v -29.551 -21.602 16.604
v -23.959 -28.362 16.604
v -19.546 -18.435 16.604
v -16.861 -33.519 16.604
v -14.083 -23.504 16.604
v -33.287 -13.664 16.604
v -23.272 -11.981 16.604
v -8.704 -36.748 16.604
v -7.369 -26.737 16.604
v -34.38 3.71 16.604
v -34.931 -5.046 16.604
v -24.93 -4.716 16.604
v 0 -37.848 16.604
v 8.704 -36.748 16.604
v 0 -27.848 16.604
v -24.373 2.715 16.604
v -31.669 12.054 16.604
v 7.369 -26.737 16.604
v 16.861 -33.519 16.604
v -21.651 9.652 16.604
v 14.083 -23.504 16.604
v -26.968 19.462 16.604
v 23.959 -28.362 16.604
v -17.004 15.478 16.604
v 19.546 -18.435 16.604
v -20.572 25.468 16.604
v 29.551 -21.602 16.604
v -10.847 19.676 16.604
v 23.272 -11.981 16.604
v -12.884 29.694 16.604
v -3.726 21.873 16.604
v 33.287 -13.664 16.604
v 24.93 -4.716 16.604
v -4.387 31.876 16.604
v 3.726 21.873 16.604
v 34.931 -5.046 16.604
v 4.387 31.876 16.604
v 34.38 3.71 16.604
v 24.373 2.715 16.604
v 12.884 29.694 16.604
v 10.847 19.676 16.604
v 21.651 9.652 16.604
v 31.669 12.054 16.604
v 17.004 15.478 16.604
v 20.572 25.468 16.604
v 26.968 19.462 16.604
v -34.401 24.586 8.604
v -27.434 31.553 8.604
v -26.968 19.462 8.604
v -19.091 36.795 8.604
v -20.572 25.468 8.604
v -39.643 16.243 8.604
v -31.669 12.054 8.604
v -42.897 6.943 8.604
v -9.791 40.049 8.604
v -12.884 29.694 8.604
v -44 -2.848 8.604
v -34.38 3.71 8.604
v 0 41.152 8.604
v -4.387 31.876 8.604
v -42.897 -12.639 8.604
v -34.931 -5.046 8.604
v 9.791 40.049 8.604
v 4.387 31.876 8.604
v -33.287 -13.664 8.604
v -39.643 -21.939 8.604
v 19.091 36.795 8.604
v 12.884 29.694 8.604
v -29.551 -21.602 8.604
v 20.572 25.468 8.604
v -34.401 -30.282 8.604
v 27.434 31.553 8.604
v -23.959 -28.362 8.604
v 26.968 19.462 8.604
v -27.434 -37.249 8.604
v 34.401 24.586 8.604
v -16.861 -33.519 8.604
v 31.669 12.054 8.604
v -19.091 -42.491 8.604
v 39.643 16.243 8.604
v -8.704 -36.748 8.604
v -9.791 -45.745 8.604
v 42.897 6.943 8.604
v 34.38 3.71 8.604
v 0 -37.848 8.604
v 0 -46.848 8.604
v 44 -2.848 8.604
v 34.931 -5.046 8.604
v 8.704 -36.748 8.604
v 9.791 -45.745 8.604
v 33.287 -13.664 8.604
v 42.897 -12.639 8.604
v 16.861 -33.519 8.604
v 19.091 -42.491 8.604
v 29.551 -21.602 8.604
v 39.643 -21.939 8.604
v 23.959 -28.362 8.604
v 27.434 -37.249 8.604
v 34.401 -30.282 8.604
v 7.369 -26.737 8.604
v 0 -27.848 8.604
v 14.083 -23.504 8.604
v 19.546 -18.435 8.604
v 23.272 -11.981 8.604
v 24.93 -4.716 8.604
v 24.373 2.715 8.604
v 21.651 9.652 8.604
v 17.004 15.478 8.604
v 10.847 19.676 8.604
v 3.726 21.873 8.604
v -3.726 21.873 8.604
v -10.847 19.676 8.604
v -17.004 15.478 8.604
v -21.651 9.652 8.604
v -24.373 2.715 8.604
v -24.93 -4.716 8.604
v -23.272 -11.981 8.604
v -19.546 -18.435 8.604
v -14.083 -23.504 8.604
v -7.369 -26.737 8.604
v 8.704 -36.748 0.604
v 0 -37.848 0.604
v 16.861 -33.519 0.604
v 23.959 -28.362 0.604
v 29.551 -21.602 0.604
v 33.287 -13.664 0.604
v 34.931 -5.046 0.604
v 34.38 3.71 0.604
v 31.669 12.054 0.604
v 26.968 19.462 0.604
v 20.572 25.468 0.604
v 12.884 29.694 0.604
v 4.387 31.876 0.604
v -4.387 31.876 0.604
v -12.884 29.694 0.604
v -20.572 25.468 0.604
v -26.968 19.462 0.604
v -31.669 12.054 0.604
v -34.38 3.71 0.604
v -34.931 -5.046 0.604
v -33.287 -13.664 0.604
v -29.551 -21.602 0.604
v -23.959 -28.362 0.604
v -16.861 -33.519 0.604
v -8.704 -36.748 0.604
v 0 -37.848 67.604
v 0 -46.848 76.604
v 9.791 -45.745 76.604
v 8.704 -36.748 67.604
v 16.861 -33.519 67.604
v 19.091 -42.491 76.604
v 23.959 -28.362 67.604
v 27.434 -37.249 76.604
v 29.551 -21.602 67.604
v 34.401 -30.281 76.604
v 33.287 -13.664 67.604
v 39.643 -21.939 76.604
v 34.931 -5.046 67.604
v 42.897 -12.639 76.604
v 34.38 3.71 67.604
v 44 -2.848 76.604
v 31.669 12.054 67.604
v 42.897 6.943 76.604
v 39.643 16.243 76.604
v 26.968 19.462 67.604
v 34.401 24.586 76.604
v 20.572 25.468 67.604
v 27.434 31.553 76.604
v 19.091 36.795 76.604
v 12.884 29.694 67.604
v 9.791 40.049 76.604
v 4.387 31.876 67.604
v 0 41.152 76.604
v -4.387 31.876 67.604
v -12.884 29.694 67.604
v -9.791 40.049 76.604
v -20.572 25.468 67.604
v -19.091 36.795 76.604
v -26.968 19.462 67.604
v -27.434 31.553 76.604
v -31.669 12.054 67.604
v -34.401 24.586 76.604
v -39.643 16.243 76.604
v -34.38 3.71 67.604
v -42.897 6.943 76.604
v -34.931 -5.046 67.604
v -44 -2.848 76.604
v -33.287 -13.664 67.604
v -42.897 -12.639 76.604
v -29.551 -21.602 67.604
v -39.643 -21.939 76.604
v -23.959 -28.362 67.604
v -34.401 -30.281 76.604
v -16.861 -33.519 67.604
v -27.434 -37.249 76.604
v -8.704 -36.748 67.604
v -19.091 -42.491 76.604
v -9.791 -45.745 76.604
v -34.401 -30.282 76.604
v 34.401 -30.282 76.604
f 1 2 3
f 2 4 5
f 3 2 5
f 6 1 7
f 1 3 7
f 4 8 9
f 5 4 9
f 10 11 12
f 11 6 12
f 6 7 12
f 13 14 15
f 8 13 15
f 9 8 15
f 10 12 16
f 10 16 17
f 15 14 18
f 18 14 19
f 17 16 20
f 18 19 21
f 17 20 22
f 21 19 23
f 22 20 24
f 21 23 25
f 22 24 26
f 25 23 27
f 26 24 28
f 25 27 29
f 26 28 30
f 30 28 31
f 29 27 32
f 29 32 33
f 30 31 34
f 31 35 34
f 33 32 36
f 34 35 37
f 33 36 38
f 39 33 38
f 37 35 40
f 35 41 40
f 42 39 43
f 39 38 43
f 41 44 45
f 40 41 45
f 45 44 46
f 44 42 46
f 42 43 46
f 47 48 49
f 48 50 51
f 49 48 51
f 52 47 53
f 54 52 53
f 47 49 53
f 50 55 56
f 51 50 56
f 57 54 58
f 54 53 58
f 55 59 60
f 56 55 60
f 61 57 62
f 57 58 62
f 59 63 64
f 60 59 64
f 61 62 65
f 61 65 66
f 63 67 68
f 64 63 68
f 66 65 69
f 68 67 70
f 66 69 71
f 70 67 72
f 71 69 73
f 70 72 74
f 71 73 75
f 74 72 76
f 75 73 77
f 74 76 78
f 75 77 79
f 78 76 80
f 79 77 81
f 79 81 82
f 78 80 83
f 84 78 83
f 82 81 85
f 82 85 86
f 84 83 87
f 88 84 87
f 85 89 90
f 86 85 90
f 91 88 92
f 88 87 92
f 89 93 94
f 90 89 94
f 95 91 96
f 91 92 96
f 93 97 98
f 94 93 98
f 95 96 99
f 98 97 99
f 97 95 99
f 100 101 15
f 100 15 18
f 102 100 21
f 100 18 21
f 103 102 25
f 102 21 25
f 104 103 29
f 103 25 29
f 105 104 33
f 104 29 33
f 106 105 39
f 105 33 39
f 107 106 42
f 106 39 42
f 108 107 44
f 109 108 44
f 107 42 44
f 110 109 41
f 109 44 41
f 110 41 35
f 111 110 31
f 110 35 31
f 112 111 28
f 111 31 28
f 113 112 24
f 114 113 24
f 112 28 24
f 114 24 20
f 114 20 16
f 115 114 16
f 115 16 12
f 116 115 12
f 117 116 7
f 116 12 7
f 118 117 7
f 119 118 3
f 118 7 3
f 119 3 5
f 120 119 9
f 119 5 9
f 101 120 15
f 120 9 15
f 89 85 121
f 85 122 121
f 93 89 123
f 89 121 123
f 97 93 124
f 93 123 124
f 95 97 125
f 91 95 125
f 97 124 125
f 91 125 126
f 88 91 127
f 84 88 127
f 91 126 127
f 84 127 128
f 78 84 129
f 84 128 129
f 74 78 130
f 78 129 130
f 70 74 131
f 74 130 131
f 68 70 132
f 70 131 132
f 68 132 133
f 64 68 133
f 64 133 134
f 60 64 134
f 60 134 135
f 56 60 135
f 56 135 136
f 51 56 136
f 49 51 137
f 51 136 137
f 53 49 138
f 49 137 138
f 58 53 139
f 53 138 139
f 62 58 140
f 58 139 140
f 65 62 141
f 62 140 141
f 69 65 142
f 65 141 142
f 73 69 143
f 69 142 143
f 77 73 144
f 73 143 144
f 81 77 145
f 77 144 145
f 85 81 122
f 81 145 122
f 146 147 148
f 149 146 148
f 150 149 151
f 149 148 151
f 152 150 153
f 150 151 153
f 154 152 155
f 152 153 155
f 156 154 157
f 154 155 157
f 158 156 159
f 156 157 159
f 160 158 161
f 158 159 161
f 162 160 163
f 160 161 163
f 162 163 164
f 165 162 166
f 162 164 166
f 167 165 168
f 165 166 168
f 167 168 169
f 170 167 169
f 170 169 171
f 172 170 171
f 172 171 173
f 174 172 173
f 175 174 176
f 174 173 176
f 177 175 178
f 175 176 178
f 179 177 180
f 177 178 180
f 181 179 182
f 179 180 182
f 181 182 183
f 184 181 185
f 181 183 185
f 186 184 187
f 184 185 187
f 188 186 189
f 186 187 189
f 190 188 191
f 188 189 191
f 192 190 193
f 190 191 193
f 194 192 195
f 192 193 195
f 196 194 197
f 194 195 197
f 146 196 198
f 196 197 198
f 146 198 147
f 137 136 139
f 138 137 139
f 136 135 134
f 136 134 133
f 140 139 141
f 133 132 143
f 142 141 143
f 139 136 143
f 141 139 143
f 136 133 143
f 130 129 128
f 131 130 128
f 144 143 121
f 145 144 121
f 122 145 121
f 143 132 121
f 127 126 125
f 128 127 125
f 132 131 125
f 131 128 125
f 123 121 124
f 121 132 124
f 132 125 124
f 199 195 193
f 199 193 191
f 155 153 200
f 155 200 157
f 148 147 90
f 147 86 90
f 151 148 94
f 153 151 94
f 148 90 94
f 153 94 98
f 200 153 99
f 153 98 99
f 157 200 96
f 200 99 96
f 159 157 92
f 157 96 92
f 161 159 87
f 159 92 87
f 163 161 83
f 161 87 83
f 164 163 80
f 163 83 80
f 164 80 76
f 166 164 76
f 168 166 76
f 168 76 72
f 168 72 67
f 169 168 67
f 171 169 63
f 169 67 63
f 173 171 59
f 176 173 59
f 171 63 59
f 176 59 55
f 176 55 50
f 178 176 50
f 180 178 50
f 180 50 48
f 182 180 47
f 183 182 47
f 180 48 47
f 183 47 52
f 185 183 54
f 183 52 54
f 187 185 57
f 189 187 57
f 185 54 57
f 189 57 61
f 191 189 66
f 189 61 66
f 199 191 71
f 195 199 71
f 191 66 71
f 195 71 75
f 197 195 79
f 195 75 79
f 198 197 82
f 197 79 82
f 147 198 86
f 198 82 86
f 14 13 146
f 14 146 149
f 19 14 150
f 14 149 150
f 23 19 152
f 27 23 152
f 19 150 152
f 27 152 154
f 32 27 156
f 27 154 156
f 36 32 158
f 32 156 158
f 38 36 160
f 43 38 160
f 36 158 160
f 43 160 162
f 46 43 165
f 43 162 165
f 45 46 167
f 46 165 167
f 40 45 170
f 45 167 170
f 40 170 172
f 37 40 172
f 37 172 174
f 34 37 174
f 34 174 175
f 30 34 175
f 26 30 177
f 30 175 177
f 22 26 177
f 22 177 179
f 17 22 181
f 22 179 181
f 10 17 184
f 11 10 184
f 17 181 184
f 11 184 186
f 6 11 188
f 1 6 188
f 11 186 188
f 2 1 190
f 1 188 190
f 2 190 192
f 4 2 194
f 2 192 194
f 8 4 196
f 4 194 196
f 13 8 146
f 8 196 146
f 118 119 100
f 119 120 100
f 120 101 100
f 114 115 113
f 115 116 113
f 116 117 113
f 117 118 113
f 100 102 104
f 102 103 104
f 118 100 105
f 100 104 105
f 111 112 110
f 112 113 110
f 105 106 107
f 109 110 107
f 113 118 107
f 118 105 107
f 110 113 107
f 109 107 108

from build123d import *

# Parameters (mm, degrees)
F2_SIZE = 8.99999


# Not quite as in the source:
# - a fillet or chamfer is up to 0.001 mm smaller than in the source, because OpenCascade refuses the exact size


with BuildPart() as f1:
    # F0 (on Right) → F1 (revolve)
    with BuildSketch(Plane.YZ):
        Polygon((-37.8479540345, 16.603627705), (-37.8479540345, 76.603627705), (-46.8479540345, 76.603627705), (-46.8479540345, 8.603627705), (-37.8479540345, 8.603627705), (-37.8479540345, 0.603627705), (-2.8479540345, 0.603627705), (-2.8479540345, 8.603627705), (-27.8479540345, 8.603627705), (-27.8479540345, 16.603627705), align=None)
    revolve(axis=Axis((0, -2.8479540345, 4.603627705), (0, 0, 1)))

    # F2 (size 9 in the source; OpenCascade refuses exactly that, so slightly less here)
    f2_edges = [f1.edges().sort_by_distance(p)[0] for p in [
        (0, 32.152046, 76.603628),
    ]]
    chamfer(f2_edges, length=F2_SIZE)


solid = f1.part
